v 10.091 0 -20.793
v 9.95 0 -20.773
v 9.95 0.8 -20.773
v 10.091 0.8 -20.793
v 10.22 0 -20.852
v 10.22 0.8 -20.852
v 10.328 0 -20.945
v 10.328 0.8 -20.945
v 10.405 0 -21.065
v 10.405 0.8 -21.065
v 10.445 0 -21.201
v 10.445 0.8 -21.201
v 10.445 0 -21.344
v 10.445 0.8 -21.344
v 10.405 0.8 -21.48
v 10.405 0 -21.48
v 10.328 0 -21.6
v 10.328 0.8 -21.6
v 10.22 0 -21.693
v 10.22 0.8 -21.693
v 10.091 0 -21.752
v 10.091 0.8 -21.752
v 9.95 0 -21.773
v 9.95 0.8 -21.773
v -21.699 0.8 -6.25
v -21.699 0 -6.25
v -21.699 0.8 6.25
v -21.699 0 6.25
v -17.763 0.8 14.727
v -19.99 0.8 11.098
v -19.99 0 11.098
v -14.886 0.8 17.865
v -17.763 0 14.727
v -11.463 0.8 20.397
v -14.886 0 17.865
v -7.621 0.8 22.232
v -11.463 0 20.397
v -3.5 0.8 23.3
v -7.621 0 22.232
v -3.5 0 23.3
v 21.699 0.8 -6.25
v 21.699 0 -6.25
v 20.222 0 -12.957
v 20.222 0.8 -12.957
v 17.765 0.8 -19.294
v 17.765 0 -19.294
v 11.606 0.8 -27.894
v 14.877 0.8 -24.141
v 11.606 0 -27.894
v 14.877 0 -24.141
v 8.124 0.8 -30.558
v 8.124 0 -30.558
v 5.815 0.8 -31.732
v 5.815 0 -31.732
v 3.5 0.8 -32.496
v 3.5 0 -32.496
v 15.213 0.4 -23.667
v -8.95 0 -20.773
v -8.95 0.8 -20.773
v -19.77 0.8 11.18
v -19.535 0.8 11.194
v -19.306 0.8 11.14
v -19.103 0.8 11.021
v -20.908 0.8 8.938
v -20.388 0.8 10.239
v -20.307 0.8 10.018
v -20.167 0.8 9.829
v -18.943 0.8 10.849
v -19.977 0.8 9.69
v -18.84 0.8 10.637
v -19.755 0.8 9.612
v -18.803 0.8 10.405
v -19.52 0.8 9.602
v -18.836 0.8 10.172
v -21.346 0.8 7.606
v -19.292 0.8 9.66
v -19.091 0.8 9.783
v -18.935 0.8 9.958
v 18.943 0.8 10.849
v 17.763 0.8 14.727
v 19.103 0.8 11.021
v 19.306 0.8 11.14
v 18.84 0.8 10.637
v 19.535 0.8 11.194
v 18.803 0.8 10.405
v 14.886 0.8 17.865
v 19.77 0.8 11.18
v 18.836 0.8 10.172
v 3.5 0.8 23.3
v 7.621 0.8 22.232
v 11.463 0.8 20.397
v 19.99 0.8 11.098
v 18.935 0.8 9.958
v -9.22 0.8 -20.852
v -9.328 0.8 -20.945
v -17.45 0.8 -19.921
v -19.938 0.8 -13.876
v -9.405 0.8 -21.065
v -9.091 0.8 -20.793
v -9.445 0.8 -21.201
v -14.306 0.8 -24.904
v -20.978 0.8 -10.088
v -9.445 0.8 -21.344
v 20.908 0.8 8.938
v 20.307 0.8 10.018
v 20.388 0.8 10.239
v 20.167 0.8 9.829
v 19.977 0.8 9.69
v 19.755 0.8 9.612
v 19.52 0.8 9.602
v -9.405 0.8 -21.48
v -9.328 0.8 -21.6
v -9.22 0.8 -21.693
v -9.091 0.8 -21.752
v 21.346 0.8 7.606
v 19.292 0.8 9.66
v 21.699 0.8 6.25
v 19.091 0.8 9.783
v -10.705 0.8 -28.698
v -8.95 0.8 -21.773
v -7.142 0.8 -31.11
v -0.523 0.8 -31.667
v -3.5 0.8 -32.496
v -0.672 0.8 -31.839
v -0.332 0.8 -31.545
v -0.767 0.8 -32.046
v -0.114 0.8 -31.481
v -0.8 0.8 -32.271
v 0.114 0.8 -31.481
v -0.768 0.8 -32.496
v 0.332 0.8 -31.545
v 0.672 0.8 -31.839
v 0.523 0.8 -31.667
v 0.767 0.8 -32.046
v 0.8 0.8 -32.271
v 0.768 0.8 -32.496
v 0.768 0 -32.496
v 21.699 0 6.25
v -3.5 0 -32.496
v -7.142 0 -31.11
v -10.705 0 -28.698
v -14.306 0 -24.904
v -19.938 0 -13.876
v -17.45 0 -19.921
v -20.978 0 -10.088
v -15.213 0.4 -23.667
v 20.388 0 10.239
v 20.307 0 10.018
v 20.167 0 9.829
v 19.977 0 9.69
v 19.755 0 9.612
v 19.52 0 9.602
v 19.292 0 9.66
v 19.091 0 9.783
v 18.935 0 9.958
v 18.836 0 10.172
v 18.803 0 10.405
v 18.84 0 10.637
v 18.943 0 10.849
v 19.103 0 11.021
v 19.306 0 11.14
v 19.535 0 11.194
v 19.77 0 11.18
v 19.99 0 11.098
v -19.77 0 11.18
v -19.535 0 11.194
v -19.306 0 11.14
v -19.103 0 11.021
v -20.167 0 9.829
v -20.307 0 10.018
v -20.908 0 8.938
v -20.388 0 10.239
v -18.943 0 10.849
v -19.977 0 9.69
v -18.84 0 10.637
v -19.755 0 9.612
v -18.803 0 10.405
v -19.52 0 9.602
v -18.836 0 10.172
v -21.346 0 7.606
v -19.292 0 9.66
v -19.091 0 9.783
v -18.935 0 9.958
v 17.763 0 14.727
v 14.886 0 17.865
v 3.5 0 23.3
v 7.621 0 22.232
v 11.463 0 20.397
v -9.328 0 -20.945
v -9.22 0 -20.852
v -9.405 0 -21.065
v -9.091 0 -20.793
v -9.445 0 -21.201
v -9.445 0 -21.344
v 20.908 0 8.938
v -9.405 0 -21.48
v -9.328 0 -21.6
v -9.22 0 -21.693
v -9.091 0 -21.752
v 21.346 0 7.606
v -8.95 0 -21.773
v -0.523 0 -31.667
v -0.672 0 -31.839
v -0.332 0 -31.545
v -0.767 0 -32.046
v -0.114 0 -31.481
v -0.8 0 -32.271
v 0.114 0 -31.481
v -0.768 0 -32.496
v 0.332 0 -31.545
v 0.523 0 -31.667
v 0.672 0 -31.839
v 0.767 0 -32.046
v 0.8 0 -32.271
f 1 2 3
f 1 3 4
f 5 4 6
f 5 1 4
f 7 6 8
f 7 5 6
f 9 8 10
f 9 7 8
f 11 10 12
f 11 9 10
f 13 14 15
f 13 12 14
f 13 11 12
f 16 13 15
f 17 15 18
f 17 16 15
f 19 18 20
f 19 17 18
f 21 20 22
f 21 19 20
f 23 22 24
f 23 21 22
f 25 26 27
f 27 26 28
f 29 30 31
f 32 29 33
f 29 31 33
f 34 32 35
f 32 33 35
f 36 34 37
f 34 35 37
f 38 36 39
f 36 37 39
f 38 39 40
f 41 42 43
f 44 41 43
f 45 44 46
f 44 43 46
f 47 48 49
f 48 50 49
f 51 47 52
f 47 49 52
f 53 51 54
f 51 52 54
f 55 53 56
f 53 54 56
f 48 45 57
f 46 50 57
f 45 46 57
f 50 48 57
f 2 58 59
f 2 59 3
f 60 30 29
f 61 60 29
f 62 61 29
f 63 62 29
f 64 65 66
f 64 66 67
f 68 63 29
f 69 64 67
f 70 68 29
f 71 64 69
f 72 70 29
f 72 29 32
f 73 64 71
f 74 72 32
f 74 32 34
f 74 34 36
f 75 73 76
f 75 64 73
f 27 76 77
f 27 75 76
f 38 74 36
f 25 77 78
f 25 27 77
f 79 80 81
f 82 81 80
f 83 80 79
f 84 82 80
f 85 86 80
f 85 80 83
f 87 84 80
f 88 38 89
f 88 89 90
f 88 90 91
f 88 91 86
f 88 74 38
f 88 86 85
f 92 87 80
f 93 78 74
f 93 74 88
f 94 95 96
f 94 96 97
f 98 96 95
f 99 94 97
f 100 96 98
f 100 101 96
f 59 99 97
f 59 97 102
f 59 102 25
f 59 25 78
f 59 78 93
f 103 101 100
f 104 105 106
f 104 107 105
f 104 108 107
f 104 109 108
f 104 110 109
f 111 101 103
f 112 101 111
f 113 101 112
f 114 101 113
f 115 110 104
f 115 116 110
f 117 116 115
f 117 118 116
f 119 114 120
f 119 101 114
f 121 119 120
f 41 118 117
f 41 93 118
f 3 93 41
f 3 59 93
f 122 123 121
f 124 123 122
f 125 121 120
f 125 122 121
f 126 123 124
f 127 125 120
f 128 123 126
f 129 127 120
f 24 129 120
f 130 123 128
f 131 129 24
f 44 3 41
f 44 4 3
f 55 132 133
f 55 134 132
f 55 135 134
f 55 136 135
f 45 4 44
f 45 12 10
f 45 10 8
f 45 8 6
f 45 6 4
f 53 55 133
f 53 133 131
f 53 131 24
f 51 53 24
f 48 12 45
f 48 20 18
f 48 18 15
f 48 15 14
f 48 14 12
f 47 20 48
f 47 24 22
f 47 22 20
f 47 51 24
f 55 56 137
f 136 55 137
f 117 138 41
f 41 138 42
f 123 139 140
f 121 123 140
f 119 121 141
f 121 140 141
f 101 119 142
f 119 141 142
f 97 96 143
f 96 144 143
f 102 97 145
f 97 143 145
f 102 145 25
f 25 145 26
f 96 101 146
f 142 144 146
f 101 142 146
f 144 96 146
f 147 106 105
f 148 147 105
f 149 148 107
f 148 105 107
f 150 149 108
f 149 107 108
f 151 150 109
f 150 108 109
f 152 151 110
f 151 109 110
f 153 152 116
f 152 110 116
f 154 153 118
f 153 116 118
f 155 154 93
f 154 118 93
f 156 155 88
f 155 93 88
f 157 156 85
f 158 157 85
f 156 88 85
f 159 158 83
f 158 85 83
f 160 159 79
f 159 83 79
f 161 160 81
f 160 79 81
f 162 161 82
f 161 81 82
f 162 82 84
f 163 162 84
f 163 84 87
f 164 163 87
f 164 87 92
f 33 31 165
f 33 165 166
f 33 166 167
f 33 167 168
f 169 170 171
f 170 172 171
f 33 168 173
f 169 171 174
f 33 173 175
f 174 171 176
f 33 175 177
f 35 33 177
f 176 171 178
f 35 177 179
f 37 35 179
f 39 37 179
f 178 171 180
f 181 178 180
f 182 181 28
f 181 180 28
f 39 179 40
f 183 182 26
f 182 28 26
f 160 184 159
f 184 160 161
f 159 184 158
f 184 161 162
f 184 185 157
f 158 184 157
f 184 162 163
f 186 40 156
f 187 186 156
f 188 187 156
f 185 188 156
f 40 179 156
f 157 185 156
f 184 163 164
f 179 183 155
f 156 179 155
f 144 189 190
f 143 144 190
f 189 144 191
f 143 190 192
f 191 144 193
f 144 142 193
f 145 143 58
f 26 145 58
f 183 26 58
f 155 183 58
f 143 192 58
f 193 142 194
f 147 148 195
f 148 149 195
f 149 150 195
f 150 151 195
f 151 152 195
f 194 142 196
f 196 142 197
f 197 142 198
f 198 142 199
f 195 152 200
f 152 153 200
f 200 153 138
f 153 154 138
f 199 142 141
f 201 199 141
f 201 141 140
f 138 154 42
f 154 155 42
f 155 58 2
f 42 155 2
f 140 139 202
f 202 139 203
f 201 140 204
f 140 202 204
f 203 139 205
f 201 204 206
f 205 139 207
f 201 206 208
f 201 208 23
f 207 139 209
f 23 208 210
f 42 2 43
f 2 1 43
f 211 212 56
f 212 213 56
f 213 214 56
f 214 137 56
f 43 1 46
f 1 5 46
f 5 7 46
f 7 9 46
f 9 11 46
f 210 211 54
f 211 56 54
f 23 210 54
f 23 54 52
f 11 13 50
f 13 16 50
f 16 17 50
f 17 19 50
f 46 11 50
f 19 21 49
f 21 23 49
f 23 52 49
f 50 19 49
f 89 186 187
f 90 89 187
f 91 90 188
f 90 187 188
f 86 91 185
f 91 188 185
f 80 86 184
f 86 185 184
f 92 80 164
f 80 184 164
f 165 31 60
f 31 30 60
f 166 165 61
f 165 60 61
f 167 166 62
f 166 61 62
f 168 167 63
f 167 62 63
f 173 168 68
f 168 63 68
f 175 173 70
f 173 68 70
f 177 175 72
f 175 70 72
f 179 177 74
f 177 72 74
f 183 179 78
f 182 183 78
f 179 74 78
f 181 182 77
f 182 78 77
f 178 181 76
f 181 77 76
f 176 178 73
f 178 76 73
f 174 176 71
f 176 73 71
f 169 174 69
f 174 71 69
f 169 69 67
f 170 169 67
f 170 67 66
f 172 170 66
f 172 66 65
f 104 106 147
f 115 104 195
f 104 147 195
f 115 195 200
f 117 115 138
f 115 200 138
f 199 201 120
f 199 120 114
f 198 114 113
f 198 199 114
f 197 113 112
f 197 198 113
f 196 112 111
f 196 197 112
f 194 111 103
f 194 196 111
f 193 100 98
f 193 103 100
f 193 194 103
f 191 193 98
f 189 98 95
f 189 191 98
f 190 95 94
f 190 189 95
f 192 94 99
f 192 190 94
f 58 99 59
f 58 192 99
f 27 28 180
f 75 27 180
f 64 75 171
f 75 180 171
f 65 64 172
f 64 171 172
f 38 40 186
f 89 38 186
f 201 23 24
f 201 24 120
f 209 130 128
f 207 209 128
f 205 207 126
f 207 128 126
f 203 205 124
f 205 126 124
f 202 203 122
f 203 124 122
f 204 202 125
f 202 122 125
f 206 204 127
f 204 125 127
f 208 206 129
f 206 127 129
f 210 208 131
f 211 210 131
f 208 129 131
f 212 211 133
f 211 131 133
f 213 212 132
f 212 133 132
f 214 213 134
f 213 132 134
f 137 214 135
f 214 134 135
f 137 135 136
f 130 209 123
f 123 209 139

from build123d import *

# Parameters (mm, degrees)
BOSS_EXTRUDE1_DEPTH = 0.8
CUT_EXTRUDE1_DEPTH  = 1.8000001
SKETCH3_R           = 0.8
CUT_EXTRUDE2_DEPTH  = 1.8000001


with BuildPart() as part:
    # Sketch1 → Boss-Extrude1 (new body)
    with BuildSketch(Plane(origin=(0, 0, 0), x_dir=(1, 0, 0), z_dir=(0, 1, 0))):
        with BuildLine():
            Line((3.5, 32.496165092), (-3.5, 32.496165092))
            add(Edge.make_bspline(
                [(-3.5, 32.496165092), (-18.367827069, 28.850667185), (-21.698636831, 6.25)],
                knots=[3.299552084, 3.299552084, 3.299552084, 4.489304273, 4.489304273, 4.489304273], degree=2, weights=[1, 0.828217943, 1]))
            Line((-21.698636831, 6.25), (-21.698636831, -6.25))
            ThreePointArc((-21.698636831, -6.25), (-15.212563947, -17.564440685), (-3.5, -23.300428417))
            Line((-3.5, -23.300428417), (3.5, -23.300428417))
            ThreePointArc((3.5, -23.300428417), (15.212563947, -17.564440685), (21.698636831, -6.25))
            Line((21.698636831, -6.25), (21.698636831, 6.25))
            add(Edge.make_bspline(
                [(21.698636831, 6.25), (18.367827069, 28.850667185), (3.5, 32.496165092)],
                knots=[1.793881034, 1.793881034, 1.793881034, 2.983633223, 2.983633223, 2.983633223], degree=2, weights=[1, 0.828217943, 1]))
        make_face()
    extrude(amount=BOSS_EXTRUDE1_DEPTH)

    # Sketch2 → Cut-Extrude1 (cut, through all)
    with BuildSketch(Plane.XZ):
        with BuildLine():
            Line((-8.95, -20.772566383), (9.95, -20.772566383))
            ThreePointArc((9.95, -20.772566383), (10.45, -21.272566383), (9.95, -21.772566383))
            Line((9.95, -21.772566383), (-8.95, -21.772566383))
            ThreePointArc((-8.95, -21.772566383), (-9.45, -21.272566383), (-8.95, -20.772566383))
        make_face()
    extrude(amount=-CUT_EXTRUDE1_DEPTH, mode=Mode.SUBTRACT)

    # Sketch3 → Cut-Extrude2 (cut, through all)
    with BuildSketch(Plane(origin=(0, 0.8, 0), x_dir=(1, 0, 0), z_dir=(0, 1, 0))):
        with Locations((0, 32.272488183)):
            Circle(SKETCH3_R)
        with Locations((19.60344615, -10.397433617)):
            Circle(SKETCH3_R)
        with Locations((-19.60344615, -10.397433617)):
            Circle(SKETCH3_R)
    extrude(amount=-CUT_EXTRUDE2_DEPTH, mode=Mode.SUBTRACT)


solid = part.part
